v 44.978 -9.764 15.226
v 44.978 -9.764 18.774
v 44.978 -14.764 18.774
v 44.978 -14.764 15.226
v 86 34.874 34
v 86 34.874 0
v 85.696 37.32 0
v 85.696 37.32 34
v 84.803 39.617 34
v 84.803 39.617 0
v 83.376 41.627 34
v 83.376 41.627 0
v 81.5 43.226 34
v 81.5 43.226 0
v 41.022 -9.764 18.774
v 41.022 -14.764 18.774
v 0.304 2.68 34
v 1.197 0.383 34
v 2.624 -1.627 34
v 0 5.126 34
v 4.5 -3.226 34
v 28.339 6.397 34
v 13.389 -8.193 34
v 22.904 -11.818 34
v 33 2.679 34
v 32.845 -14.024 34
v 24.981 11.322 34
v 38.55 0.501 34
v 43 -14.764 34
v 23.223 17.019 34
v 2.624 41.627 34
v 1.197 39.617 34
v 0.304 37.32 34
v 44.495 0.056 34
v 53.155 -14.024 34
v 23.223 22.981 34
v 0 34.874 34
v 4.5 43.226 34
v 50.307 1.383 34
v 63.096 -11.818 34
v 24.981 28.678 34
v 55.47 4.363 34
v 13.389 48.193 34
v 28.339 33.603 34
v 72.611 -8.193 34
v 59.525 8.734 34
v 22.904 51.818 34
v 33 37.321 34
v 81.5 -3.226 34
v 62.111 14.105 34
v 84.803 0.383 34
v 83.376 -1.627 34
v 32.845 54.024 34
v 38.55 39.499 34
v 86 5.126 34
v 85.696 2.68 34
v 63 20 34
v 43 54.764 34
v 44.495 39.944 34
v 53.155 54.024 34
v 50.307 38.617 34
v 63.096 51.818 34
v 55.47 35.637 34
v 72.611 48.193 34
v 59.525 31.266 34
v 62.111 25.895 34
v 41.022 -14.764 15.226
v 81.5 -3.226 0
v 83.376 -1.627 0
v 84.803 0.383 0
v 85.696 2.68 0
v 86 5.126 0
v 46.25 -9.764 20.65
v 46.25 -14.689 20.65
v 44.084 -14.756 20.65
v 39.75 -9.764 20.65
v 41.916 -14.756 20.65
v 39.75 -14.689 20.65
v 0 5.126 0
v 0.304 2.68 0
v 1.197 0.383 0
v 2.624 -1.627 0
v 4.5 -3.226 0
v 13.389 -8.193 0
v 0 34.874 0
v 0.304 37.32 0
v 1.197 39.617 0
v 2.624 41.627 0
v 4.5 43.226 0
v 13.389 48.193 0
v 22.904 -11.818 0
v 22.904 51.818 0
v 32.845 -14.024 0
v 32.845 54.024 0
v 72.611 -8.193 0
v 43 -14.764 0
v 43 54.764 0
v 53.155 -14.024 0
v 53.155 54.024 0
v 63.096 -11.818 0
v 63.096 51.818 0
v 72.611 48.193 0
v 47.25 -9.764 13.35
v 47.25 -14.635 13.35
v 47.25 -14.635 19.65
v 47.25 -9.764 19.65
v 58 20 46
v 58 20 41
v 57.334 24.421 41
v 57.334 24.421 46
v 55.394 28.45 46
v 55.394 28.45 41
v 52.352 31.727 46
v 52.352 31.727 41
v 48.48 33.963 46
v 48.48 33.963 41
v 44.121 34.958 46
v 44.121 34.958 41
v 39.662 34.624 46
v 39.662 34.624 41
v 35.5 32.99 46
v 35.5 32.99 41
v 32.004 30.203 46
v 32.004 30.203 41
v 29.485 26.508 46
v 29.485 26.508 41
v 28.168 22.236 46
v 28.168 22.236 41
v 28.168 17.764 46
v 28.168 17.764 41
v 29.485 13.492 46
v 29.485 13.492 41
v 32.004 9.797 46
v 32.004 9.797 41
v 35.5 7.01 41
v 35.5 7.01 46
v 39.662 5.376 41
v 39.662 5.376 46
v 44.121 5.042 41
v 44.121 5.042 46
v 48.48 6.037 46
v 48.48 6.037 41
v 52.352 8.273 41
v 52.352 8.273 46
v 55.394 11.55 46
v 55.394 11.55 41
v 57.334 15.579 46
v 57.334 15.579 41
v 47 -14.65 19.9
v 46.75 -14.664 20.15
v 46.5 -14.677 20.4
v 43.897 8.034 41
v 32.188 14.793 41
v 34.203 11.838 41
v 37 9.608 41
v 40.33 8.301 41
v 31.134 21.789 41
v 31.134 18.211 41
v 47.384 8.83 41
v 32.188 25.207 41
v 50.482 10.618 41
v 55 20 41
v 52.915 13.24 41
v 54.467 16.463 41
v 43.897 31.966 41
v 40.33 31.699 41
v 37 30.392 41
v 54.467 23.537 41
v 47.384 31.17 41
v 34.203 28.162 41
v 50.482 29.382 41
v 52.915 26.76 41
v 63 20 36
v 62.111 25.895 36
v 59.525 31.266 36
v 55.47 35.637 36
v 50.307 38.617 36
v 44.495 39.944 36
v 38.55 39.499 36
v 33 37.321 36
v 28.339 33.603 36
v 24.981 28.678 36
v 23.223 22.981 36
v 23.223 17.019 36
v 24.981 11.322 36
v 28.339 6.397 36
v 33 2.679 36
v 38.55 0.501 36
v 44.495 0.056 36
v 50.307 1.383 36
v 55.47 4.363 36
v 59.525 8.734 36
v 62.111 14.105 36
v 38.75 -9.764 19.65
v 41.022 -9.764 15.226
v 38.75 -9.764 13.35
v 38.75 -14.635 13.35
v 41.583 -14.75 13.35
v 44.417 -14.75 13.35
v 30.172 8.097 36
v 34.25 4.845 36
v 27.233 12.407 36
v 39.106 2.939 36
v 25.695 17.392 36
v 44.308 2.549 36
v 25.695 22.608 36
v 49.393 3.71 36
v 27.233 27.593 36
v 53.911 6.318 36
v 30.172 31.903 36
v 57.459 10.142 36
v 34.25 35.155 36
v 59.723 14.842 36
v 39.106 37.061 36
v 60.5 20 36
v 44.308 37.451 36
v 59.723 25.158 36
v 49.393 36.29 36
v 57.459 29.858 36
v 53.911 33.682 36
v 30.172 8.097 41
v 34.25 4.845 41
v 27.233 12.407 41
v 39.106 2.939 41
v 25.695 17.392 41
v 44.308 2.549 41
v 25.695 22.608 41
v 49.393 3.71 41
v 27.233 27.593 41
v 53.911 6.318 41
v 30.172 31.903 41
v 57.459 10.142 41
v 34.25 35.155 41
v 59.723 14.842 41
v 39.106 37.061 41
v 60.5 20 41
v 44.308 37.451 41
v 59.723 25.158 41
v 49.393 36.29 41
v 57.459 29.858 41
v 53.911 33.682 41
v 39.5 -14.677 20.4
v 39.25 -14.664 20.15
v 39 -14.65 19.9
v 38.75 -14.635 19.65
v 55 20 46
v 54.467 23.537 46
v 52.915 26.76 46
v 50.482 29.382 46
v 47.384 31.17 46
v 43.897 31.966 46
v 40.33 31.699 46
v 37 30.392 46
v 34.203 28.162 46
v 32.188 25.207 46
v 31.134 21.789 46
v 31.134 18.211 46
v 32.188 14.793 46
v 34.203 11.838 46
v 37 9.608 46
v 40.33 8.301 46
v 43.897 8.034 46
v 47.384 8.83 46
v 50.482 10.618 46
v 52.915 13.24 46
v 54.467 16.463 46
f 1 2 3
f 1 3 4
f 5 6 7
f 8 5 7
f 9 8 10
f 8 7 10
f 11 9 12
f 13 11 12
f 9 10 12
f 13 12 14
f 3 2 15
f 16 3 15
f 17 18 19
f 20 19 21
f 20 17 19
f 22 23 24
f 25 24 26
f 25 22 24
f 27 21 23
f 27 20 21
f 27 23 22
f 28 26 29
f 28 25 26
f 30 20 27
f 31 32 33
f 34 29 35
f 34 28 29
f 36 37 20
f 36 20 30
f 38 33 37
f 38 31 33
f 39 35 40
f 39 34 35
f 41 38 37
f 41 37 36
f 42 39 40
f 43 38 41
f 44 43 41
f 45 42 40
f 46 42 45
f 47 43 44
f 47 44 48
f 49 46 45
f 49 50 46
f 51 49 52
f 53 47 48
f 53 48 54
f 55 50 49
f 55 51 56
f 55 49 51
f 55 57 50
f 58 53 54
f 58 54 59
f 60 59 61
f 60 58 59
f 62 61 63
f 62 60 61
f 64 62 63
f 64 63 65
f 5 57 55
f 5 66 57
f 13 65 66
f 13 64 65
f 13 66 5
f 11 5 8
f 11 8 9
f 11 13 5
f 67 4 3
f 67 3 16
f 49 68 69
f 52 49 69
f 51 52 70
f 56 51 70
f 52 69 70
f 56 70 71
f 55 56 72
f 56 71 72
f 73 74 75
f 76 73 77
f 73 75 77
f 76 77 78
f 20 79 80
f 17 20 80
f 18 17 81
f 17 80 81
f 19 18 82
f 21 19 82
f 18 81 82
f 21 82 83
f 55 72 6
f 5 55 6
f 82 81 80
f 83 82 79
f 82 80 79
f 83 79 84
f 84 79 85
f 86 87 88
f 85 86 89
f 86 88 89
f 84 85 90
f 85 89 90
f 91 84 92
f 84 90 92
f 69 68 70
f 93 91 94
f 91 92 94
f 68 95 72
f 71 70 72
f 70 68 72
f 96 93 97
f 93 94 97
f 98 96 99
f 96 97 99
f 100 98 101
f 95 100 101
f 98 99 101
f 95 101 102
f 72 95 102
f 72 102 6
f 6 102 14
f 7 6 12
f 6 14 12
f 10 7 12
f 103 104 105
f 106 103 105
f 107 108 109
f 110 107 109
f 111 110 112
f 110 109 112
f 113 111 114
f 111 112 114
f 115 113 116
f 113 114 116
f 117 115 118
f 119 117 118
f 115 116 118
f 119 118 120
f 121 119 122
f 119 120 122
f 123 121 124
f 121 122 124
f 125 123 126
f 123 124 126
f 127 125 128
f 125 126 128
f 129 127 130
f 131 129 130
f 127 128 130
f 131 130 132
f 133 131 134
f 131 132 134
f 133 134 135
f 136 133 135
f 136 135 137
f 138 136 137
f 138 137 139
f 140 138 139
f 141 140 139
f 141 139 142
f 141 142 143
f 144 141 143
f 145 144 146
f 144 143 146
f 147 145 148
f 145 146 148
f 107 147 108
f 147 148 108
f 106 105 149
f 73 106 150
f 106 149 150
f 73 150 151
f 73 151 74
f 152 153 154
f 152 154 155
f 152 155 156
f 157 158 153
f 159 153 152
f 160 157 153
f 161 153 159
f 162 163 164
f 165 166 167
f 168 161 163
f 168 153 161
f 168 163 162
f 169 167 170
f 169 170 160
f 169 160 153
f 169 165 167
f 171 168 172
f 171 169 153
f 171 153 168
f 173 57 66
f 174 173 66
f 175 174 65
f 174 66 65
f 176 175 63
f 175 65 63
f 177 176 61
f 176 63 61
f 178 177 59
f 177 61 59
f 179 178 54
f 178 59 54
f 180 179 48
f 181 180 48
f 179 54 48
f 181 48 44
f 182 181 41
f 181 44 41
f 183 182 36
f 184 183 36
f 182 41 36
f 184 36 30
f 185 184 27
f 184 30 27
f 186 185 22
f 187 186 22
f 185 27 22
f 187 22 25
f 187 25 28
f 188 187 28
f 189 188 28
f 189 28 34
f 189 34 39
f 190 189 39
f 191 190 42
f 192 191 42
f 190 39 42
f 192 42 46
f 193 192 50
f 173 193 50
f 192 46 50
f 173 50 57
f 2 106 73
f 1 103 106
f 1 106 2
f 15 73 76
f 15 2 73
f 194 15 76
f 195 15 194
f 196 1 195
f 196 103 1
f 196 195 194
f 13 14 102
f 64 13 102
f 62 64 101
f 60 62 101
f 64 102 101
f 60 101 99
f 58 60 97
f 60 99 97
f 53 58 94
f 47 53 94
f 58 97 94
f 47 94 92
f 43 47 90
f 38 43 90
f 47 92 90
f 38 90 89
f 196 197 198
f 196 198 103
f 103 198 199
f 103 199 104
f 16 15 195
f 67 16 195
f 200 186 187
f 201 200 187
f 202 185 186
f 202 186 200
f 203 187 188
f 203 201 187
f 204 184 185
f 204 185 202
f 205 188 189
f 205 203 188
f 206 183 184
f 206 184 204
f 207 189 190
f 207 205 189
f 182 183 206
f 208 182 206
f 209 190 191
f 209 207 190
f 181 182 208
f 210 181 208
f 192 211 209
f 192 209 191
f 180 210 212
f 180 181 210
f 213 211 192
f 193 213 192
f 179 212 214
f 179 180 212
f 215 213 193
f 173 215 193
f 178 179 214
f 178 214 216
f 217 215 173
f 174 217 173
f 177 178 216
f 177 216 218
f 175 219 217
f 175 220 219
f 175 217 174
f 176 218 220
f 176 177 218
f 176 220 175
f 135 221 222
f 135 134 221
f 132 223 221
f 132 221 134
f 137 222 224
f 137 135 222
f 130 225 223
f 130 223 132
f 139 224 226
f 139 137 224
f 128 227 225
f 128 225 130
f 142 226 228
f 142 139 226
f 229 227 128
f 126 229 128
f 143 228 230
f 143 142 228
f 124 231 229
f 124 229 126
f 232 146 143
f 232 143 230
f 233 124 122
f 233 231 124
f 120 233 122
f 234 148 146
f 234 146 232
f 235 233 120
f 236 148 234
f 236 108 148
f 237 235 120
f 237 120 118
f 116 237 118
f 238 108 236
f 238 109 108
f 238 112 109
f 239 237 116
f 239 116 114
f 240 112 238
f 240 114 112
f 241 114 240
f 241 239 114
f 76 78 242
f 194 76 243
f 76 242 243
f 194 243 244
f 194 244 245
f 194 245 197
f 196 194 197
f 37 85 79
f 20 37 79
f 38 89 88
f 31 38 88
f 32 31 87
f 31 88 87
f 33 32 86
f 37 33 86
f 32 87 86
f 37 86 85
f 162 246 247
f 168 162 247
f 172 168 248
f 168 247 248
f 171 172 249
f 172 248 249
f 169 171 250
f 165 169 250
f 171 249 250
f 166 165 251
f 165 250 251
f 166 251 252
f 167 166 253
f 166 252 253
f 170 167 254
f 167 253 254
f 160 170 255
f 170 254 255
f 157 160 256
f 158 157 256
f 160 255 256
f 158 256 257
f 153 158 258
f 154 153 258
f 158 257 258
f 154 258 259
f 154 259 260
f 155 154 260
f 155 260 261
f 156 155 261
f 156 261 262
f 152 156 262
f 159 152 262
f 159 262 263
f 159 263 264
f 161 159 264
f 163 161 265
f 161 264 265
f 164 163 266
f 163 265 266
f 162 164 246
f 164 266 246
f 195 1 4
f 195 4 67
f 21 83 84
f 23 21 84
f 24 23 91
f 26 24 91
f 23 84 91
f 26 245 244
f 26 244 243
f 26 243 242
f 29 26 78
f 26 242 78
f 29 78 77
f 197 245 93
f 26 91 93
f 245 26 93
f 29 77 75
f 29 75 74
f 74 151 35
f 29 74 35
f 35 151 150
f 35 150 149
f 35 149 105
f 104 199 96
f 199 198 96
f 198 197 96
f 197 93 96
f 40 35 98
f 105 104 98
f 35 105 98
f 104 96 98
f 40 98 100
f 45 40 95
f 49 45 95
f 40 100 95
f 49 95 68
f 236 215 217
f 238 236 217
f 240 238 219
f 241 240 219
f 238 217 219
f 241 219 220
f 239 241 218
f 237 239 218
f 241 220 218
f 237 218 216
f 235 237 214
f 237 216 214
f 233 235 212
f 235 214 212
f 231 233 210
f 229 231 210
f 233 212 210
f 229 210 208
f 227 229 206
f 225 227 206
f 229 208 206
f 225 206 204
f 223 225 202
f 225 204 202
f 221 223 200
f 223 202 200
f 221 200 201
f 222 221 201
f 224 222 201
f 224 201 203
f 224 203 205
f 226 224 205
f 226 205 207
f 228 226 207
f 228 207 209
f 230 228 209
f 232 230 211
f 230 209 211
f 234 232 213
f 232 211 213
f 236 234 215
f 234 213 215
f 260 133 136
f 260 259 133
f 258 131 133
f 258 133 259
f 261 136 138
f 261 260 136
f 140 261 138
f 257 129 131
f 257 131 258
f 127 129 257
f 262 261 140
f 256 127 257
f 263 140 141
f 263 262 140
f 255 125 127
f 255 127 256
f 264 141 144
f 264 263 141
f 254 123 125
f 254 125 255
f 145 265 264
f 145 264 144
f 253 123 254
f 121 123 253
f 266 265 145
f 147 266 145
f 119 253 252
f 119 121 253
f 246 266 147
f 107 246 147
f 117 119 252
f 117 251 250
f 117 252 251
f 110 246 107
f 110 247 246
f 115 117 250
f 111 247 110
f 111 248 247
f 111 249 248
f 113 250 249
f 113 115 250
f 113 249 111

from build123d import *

# Parameters (mm, degrees)
BOSS_EXTRUDE1_DEPTH = 34
SKETCH2_R           = 20
BOSS_EXTRUDE2_DEPTH = 2
SKETCH3_R           = 17.5
BOSS_EXTRUDE3_DEPTH = 5
SKETCH4_R           = 15
BOSS_EXTRUDE4_DEPTH = 5
SKETCH5_R           = 12
CUT_EXTRUDE1_DEPTH  = 5
CUT_EXTRUDE2_DEPTH  = 5
SKETCH10_W          = 3.955735376
SKETCH10_H          = 3.547567536
BOSS_EXTRUDE5_DEPTH = 5


with BuildPart() as part:
    # Sketch1 → Boss-Extrude1 (new body)
    with BuildSketch(Plane.XY):
        with BuildLine():
            Line((86, 5.125978653), (86, 34.874021347))
            ThreePointArc((86, 34.874021347), (84.803408431, 39.617437837), (81.5, 43.225667891))
            ThreePointArc((81.5, 43.225667891), (43, 54.764142081), (4.5, 43.225667891))
            ThreePointArc((4.5, 43.225667891), (1.196591569, 39.617437837), (0, 34.874021347))
            Line((0, 34.874021347), (0, 5.125978653))
            ThreePointArc((0, 5.125978653), (1.196591569, 0.382562163), (4.5, -3.225667891))
            ThreePointArc((4.5, -3.225667891), (43, -14.764142081), (81.5, -3.225667891))
            ThreePointArc((81.5, -3.225667891), (84.803408431, 0.382562163), (86, 5.125978653))
        make_face()
    extrude(amount=BOSS_EXTRUDE1_DEPTH)

    # Sketch2 → Boss-Extrude2 (add)
    with BuildSketch(Plane.XY.offset(34)):
        with Locations((43, 20)):
            Circle(SKETCH2_R)
    extrude(amount=BOSS_EXTRUDE2_DEPTH)

    # Sketch3 → Boss-Extrude3 (add)
    with BuildSketch(Plane.XY.offset(36)):
        with Locations((43, 20)):
            Circle(SKETCH3_R)
    extrude(amount=BOSS_EXTRUDE3_DEPTH)

    # Sketch4 → Boss-Extrude4 (add)
    with BuildSketch(Plane.XY.offset(41)):
        with Locations((43, 20)):
            Circle(SKETCH4_R)
    extrude(amount=BOSS_EXTRUDE4_DEPTH)

    # Sketch5 → Cut-Extrude1 (cut)
    with BuildSketch(Plane.XY.offset(46)):
        with Locations((43, 20)):
            Circle(SKETCH5_R)
    extrude(amount=-CUT_EXTRUDE1_DEPTH, mode=Mode.SUBTRACT)

    # Sketch9 → Cut-Extrude2 (cut)
    with BuildSketch(Plane(origin=(0, -14.764142081, 0), x_dir=(-1, 0, 0), z_dir=(0, -1, 0))):
        Polygon((-43, -13.35), (-47.25, -13.35), (-47.25, -19.65), (-46.25, -20.65), (-43, -20.65), (-39.75, -20.65), (-38.75, -19.65), (-38.75, -13.35), align=None)
    extrude(amount=-CUT_EXTRUDE2_DEPTH, mode=Mode.SUBTRACT)

    # Sketch10 → Boss-Extrude5 (add)
    with BuildSketch(Plane(origin=(0, -9.764142081, 0), x_dir=(-1, 0, 0), z_dir=(0, -1, 0))):
        with Locations((-43, -17)):
            Rectangle(SKETCH10_W, SKETCH10_H)
    extrude(amount=BOSS_EXTRUDE5_DEPTH)


solid = part.part
